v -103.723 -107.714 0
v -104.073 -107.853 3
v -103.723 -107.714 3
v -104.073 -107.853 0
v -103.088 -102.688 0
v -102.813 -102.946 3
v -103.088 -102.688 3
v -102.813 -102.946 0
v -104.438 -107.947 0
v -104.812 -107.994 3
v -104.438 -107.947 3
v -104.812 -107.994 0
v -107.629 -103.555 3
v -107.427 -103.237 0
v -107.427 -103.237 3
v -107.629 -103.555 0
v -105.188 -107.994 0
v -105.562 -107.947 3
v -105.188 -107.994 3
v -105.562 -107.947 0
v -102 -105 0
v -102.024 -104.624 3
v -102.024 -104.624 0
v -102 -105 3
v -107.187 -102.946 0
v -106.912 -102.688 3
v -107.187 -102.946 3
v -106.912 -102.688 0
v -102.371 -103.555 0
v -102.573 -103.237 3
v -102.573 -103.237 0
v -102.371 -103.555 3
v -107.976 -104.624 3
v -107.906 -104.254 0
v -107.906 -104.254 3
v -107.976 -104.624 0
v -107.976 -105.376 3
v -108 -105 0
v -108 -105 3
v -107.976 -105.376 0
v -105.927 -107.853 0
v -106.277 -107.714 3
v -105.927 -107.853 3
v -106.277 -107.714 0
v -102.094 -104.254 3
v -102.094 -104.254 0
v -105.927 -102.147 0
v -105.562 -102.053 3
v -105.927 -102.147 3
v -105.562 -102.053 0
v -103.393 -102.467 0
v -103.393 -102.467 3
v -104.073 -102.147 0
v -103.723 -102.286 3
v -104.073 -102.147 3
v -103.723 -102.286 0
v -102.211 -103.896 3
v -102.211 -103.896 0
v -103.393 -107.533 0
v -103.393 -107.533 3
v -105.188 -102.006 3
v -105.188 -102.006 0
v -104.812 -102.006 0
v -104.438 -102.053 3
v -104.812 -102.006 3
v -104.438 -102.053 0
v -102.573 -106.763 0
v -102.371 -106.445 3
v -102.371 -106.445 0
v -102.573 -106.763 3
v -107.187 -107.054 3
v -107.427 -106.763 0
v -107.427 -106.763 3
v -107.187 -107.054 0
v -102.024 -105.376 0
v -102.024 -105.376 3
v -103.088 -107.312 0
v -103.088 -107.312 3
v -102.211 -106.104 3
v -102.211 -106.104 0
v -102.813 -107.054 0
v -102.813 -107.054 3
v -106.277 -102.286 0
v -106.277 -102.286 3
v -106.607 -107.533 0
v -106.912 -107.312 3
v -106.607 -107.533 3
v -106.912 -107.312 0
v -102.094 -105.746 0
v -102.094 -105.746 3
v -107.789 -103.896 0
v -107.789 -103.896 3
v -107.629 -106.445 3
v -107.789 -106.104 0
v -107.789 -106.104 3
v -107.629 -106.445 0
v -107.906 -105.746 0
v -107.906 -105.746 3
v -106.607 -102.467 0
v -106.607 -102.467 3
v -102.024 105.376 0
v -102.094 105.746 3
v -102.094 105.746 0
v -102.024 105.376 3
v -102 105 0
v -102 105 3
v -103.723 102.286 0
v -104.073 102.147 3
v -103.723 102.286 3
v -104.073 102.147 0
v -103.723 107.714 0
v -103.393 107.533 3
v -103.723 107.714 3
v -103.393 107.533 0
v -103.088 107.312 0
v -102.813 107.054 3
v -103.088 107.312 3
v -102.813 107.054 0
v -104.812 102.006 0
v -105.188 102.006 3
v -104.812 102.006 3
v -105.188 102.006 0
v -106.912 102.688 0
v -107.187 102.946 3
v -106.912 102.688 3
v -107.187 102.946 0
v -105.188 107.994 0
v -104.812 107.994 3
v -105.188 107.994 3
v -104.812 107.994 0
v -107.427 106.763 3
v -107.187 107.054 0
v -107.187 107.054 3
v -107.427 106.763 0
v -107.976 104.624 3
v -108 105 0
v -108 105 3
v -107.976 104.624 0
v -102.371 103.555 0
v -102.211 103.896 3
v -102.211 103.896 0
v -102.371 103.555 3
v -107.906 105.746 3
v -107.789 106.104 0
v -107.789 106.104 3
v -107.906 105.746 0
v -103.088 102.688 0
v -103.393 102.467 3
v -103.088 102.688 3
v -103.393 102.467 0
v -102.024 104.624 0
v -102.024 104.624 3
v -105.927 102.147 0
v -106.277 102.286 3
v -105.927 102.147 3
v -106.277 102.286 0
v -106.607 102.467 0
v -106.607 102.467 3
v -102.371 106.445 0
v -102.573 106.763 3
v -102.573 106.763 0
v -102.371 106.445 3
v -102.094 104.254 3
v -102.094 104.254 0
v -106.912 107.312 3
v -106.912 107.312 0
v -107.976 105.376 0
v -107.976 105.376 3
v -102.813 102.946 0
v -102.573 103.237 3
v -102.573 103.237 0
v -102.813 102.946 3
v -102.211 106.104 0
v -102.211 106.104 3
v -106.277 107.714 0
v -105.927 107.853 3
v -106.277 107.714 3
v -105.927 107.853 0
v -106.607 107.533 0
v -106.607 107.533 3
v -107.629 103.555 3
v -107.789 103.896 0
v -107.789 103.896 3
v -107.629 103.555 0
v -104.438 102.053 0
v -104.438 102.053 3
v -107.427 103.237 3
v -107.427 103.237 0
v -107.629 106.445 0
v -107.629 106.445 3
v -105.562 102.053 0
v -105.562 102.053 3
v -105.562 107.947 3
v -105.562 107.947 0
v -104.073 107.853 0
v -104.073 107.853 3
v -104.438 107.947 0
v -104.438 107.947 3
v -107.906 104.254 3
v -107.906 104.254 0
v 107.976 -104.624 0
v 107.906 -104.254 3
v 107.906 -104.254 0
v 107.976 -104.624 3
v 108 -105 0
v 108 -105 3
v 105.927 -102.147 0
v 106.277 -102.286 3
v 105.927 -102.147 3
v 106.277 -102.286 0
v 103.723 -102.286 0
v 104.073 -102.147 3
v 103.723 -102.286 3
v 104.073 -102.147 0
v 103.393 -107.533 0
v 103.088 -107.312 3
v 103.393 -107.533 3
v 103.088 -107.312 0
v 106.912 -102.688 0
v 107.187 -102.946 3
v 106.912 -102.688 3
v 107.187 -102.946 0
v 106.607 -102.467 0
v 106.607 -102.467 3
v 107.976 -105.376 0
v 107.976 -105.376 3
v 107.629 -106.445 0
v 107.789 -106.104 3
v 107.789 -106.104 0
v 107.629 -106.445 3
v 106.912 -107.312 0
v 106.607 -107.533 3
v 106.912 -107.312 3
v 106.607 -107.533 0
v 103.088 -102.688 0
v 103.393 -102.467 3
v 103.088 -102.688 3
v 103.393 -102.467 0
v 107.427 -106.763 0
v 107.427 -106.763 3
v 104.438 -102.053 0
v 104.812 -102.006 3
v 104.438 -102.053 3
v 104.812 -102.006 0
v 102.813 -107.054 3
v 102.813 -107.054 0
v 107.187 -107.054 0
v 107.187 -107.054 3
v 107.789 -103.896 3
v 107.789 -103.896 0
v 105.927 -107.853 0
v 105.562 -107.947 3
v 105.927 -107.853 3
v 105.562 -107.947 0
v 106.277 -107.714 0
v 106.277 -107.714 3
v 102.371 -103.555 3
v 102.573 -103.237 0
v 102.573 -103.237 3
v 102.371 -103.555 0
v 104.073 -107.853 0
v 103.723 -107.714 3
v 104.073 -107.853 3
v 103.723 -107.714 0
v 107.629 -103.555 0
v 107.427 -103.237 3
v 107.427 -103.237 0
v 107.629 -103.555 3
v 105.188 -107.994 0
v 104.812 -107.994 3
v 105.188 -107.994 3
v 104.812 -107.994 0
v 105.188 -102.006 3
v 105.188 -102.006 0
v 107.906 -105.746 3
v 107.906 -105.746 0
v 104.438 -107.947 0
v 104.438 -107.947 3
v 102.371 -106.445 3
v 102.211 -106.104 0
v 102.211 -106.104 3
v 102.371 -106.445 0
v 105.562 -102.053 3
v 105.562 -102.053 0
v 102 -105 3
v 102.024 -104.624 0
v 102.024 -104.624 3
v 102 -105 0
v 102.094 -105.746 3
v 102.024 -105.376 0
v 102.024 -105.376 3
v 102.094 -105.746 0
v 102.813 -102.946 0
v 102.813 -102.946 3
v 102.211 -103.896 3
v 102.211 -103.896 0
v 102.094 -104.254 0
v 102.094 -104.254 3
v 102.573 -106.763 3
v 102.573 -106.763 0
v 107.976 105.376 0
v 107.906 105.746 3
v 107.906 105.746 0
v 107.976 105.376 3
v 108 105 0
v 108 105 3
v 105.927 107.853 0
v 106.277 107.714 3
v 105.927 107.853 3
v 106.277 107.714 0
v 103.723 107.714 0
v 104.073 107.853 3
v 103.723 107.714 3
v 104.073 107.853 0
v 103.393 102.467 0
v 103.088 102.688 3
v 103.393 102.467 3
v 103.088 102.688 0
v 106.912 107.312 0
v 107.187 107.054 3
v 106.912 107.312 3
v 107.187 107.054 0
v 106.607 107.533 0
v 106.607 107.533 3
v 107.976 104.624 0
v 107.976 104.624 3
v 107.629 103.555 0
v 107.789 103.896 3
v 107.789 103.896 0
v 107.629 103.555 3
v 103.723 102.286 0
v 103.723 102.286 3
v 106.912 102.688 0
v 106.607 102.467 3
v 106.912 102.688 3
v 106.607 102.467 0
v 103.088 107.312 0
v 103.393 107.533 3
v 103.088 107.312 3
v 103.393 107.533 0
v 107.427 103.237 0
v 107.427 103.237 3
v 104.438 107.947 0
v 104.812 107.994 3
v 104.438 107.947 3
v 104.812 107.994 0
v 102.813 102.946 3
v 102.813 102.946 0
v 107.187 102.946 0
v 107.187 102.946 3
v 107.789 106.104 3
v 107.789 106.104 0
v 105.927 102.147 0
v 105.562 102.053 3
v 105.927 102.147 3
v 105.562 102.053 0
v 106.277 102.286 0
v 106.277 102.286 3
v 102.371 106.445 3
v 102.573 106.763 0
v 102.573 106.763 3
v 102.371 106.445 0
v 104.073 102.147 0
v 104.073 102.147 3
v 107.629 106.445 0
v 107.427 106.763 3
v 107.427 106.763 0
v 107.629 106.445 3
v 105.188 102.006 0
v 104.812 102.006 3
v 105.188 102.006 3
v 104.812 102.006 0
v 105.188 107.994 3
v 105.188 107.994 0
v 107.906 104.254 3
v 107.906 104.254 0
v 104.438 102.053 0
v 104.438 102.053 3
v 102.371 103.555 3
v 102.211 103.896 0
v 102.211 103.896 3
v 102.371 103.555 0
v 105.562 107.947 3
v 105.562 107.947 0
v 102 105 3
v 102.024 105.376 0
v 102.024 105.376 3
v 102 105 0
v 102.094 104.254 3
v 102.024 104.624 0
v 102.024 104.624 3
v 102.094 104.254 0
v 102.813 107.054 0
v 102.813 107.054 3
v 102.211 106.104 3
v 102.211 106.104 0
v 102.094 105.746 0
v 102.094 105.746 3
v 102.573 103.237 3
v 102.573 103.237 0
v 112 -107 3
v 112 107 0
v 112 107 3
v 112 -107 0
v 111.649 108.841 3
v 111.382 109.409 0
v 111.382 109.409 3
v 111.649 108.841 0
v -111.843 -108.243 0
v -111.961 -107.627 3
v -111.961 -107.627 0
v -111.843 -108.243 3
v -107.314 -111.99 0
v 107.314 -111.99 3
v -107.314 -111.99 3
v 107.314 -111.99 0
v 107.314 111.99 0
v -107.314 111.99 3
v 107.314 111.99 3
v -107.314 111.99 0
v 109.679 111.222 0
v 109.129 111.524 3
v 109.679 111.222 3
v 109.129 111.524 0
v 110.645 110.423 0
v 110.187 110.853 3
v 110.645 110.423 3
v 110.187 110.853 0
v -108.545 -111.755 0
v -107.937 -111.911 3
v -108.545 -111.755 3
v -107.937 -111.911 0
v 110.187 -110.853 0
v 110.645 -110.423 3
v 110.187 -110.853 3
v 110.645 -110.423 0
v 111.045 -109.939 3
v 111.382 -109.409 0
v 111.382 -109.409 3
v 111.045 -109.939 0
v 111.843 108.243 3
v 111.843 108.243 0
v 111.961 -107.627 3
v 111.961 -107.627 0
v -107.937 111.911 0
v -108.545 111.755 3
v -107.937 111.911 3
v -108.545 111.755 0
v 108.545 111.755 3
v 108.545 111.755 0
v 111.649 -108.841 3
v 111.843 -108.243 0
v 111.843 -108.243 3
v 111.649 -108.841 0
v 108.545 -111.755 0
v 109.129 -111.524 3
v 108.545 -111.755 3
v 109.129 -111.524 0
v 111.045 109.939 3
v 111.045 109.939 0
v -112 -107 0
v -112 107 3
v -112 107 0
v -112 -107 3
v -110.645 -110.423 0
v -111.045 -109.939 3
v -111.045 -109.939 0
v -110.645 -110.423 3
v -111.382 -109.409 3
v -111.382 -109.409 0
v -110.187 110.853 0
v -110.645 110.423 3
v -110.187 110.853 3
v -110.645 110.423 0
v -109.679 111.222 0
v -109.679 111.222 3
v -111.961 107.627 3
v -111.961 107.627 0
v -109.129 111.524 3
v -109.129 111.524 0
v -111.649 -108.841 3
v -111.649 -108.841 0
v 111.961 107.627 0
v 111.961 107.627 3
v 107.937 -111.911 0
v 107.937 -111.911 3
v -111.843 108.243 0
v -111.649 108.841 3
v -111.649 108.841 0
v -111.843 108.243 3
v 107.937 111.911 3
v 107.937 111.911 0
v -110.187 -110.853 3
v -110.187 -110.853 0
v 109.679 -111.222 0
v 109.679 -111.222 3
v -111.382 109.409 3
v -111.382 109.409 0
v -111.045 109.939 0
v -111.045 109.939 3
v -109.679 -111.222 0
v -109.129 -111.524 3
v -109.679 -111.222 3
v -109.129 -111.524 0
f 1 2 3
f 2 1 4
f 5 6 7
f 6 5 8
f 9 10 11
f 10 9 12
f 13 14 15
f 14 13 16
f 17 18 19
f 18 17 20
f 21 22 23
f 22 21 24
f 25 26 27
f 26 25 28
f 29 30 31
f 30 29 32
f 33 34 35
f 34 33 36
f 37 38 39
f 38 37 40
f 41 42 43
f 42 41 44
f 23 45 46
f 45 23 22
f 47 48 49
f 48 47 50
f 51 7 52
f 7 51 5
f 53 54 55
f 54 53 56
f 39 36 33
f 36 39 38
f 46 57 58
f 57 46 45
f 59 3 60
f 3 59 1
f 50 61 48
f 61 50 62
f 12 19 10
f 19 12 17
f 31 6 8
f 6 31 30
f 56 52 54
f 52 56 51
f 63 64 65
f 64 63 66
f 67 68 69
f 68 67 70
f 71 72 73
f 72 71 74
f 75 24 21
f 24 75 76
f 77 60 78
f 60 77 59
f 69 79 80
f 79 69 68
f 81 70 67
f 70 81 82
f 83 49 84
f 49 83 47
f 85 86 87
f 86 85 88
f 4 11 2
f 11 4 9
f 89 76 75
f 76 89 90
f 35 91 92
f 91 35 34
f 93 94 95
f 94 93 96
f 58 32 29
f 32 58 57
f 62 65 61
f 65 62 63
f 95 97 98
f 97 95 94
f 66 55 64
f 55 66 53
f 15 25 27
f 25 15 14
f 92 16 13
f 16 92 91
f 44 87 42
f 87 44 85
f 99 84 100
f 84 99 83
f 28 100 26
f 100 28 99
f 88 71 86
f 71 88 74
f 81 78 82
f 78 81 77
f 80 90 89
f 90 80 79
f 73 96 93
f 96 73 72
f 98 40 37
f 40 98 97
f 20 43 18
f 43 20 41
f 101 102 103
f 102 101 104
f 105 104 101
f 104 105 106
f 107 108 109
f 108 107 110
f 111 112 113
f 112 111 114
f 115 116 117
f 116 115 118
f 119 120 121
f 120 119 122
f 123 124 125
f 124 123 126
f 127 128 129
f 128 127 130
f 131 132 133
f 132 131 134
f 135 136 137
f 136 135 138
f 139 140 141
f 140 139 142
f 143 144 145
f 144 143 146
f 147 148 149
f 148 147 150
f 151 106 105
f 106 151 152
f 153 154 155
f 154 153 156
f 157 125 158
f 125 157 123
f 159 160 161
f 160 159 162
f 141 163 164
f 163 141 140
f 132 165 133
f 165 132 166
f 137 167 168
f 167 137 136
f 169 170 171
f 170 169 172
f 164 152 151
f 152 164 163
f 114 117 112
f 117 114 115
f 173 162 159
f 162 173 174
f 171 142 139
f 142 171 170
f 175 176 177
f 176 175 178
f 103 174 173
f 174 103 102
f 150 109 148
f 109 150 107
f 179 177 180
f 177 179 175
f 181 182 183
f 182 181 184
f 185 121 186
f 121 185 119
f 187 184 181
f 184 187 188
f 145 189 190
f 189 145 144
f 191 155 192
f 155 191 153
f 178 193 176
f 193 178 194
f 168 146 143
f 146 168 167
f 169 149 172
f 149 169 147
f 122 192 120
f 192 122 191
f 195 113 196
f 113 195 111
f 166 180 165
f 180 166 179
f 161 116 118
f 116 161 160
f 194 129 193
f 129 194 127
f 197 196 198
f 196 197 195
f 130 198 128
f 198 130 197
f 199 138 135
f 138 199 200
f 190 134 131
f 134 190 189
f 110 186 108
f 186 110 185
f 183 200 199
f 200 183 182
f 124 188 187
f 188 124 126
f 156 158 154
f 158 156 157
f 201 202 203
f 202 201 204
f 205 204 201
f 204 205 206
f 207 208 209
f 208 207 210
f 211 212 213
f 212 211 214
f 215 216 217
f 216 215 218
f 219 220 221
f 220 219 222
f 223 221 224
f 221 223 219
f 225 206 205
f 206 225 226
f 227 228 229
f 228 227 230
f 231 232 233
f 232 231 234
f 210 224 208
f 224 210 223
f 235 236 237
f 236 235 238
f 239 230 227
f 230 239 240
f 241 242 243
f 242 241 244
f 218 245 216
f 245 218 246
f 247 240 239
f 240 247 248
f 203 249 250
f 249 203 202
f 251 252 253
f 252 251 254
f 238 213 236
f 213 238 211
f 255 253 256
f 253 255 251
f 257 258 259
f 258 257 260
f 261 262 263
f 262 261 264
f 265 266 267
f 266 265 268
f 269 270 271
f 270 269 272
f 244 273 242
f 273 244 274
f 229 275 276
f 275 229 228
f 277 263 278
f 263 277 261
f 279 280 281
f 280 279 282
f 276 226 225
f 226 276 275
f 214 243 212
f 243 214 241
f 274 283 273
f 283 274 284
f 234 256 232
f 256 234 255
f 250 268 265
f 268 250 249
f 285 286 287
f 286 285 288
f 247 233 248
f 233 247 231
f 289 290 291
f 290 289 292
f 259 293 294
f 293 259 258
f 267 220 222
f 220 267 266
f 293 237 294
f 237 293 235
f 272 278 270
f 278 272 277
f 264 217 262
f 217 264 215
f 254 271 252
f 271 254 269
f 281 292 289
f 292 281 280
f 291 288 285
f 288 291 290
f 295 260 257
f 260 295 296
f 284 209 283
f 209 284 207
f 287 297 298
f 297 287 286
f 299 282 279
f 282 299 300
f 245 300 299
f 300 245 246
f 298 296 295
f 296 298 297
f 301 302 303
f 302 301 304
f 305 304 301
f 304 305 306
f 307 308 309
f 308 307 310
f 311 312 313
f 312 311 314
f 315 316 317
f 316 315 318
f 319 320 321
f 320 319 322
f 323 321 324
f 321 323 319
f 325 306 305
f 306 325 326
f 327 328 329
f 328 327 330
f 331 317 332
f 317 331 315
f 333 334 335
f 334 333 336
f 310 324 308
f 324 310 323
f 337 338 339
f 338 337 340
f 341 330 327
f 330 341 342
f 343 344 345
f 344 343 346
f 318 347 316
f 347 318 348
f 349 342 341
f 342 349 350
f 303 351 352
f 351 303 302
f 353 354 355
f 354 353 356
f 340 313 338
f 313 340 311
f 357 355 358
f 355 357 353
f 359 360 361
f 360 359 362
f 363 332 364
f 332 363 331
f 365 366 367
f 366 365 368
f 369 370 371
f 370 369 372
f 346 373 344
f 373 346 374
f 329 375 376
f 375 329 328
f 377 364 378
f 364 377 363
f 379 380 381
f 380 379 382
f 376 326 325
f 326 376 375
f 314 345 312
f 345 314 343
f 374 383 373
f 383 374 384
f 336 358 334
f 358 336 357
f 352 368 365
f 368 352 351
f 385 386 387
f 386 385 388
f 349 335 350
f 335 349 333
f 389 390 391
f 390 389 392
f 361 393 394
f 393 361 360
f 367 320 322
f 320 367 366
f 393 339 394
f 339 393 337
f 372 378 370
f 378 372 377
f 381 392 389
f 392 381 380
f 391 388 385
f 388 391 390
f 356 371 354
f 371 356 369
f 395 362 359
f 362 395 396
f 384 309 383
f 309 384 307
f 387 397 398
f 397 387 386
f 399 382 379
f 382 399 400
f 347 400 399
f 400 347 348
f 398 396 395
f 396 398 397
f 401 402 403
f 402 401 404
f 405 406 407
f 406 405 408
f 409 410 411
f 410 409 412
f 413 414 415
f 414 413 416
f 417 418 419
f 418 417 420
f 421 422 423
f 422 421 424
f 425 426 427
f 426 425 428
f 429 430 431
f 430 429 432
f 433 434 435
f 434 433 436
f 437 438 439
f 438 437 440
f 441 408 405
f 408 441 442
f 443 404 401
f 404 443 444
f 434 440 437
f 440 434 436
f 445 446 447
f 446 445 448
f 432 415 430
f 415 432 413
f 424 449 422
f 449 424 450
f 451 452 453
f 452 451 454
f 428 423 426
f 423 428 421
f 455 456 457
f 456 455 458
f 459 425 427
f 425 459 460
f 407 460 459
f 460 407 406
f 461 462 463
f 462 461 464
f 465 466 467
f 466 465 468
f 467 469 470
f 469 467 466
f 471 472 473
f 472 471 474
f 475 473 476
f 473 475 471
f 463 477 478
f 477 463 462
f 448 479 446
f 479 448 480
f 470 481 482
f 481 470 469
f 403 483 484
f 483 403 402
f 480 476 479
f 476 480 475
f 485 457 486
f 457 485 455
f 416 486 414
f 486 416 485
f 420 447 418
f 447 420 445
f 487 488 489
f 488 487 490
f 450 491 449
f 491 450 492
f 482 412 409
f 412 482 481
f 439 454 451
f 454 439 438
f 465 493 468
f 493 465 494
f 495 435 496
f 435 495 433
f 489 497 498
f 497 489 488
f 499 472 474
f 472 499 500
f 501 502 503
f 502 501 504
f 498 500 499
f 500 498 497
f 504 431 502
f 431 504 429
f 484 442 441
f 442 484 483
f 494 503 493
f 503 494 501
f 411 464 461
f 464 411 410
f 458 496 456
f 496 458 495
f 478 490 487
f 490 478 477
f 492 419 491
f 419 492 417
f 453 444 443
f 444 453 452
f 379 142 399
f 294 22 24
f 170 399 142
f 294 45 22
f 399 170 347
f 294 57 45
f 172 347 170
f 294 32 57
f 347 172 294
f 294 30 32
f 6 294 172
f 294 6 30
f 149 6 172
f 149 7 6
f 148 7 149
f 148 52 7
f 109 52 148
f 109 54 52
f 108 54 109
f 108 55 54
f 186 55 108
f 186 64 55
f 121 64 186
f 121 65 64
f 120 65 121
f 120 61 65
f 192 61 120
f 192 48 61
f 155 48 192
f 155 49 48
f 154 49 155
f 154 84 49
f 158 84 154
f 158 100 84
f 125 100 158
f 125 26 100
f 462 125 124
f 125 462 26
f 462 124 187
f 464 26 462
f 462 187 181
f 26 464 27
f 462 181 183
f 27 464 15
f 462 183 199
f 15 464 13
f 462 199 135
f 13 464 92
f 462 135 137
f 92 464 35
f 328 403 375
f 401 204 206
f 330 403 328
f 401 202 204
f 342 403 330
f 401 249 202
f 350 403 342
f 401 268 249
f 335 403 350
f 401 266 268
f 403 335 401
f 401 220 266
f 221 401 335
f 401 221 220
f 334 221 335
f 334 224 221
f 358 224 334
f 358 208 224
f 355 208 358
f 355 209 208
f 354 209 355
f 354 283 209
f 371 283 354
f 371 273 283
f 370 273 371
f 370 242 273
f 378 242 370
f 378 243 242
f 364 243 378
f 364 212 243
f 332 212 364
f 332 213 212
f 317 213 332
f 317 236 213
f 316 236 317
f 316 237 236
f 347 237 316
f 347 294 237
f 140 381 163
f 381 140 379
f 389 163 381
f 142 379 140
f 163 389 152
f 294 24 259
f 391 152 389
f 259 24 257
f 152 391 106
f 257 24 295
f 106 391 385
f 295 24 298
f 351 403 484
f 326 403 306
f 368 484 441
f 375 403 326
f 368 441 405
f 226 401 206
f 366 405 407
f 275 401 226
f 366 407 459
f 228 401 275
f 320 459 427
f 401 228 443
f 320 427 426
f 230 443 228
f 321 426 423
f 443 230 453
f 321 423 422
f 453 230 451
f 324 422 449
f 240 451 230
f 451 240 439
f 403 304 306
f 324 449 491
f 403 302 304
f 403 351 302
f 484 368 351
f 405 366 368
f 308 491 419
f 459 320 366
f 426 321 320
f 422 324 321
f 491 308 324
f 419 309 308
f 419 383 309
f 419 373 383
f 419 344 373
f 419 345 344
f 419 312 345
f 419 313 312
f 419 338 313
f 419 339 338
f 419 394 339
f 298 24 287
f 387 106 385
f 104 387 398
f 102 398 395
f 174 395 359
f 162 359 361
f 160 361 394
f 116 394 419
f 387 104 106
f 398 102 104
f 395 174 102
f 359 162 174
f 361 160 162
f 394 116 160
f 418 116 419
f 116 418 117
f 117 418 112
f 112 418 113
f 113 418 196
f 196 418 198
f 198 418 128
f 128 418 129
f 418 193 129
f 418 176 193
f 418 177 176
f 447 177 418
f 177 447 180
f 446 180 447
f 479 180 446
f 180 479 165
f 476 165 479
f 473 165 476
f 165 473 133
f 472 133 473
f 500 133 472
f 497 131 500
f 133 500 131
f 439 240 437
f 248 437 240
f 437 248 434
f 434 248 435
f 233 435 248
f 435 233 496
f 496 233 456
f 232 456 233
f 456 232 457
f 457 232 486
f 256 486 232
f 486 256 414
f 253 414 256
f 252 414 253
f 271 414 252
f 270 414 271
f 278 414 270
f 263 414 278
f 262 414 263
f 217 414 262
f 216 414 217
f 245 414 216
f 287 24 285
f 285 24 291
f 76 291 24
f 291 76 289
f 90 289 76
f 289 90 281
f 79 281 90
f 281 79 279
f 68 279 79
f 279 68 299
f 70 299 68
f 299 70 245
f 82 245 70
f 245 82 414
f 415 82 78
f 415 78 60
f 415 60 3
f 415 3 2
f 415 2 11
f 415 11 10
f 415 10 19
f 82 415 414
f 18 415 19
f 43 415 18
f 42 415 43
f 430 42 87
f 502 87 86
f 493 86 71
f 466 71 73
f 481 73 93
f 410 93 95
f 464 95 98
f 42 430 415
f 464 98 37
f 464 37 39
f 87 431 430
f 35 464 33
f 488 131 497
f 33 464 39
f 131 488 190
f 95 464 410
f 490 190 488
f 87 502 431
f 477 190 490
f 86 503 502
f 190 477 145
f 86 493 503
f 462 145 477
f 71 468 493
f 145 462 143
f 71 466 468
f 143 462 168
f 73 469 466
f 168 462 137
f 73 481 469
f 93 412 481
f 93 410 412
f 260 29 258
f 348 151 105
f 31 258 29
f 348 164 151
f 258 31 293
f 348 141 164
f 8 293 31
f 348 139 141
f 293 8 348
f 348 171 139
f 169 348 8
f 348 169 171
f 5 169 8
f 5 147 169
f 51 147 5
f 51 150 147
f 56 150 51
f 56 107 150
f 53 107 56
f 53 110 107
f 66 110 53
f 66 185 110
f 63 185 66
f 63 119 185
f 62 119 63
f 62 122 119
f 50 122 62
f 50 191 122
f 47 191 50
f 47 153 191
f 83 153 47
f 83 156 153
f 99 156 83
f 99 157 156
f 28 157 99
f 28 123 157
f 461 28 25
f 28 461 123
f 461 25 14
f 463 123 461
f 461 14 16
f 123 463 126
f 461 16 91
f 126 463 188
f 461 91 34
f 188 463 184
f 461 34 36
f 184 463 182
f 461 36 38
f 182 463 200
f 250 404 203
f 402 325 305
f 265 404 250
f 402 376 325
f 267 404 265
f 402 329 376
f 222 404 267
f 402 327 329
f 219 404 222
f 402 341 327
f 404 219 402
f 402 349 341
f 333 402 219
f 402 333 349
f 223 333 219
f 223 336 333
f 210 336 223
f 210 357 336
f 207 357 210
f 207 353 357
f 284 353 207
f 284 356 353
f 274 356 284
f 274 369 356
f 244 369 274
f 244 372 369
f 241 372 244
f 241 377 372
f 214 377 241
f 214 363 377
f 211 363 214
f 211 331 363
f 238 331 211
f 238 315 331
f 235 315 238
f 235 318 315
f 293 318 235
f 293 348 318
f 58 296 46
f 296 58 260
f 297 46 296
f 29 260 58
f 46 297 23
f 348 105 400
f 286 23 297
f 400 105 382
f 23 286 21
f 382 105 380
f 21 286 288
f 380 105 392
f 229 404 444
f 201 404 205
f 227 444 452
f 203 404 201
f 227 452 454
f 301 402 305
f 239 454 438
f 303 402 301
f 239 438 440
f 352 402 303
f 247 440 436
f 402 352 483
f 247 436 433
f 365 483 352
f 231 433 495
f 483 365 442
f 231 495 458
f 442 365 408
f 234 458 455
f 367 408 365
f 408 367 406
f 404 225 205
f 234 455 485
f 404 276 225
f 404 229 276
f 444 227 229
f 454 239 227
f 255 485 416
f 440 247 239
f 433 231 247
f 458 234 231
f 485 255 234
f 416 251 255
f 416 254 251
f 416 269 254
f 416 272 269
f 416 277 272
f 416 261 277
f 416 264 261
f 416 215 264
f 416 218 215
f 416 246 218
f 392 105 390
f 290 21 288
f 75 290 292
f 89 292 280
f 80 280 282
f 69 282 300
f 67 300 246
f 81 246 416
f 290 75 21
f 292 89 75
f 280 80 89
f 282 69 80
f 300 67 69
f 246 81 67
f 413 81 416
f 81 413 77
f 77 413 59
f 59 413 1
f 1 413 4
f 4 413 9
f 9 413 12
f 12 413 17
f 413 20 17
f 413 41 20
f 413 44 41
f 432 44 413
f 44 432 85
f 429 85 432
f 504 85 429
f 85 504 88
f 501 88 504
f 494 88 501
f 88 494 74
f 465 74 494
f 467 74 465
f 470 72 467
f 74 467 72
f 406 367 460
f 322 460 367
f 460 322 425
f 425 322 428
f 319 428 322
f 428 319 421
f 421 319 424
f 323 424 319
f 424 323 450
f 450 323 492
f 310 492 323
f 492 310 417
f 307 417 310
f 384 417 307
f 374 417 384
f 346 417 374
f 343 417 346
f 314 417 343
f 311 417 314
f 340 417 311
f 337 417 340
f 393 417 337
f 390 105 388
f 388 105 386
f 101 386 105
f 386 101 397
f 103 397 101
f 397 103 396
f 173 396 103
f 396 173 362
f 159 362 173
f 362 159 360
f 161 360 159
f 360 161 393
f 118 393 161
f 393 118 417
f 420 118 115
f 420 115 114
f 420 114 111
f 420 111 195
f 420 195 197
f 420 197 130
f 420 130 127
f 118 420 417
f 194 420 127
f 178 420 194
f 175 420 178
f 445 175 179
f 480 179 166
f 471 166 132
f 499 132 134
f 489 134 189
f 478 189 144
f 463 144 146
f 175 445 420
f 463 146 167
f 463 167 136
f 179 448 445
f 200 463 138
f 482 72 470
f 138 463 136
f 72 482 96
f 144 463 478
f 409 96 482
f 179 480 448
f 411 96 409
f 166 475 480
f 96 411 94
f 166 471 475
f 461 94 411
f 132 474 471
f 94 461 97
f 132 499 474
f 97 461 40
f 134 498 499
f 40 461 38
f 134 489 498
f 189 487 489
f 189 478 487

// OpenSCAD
$fn = 50;


difference() {
	union() {
		hull() {
			translate(v = [-107.0000000000, 107.0000000000, 0]) {
				cylinder(h = 3, r = 5);
			}
			translate(v = [107.0000000000, 107.0000000000, 0]) {
				cylinder(h = 3, r = 5);
			}
			translate(v = [-107.0000000000, -107.0000000000, 0]) {
				cylinder(h = 3, r = 5);
			}
			translate(v = [107.0000000000, -107.0000000000, 0]) {
				cylinder(h = 3, r = 5);
			}
		}
	}
	union() {
		translate(v = [-105.0000000000, -105.0000000000, -100.0000000000]) {
			cylinder(h = 200, r = 3.0000000000);
		}
		translate(v = [-105.0000000000, 105.0000000000, -100.0000000000]) {
			cylinder(h = 200, r = 3.0000000000);
		}
		translate(v = [105.0000000000, -105.0000000000, -100.0000000000]) {
			cylinder(h = 200, r = 3.0000000000);
		}
		translate(v = [105.0000000000, 105.0000000000, -100.0000000000]) {
			cylinder(h = 200, r = 3.0000000000);
		}
	}
}
